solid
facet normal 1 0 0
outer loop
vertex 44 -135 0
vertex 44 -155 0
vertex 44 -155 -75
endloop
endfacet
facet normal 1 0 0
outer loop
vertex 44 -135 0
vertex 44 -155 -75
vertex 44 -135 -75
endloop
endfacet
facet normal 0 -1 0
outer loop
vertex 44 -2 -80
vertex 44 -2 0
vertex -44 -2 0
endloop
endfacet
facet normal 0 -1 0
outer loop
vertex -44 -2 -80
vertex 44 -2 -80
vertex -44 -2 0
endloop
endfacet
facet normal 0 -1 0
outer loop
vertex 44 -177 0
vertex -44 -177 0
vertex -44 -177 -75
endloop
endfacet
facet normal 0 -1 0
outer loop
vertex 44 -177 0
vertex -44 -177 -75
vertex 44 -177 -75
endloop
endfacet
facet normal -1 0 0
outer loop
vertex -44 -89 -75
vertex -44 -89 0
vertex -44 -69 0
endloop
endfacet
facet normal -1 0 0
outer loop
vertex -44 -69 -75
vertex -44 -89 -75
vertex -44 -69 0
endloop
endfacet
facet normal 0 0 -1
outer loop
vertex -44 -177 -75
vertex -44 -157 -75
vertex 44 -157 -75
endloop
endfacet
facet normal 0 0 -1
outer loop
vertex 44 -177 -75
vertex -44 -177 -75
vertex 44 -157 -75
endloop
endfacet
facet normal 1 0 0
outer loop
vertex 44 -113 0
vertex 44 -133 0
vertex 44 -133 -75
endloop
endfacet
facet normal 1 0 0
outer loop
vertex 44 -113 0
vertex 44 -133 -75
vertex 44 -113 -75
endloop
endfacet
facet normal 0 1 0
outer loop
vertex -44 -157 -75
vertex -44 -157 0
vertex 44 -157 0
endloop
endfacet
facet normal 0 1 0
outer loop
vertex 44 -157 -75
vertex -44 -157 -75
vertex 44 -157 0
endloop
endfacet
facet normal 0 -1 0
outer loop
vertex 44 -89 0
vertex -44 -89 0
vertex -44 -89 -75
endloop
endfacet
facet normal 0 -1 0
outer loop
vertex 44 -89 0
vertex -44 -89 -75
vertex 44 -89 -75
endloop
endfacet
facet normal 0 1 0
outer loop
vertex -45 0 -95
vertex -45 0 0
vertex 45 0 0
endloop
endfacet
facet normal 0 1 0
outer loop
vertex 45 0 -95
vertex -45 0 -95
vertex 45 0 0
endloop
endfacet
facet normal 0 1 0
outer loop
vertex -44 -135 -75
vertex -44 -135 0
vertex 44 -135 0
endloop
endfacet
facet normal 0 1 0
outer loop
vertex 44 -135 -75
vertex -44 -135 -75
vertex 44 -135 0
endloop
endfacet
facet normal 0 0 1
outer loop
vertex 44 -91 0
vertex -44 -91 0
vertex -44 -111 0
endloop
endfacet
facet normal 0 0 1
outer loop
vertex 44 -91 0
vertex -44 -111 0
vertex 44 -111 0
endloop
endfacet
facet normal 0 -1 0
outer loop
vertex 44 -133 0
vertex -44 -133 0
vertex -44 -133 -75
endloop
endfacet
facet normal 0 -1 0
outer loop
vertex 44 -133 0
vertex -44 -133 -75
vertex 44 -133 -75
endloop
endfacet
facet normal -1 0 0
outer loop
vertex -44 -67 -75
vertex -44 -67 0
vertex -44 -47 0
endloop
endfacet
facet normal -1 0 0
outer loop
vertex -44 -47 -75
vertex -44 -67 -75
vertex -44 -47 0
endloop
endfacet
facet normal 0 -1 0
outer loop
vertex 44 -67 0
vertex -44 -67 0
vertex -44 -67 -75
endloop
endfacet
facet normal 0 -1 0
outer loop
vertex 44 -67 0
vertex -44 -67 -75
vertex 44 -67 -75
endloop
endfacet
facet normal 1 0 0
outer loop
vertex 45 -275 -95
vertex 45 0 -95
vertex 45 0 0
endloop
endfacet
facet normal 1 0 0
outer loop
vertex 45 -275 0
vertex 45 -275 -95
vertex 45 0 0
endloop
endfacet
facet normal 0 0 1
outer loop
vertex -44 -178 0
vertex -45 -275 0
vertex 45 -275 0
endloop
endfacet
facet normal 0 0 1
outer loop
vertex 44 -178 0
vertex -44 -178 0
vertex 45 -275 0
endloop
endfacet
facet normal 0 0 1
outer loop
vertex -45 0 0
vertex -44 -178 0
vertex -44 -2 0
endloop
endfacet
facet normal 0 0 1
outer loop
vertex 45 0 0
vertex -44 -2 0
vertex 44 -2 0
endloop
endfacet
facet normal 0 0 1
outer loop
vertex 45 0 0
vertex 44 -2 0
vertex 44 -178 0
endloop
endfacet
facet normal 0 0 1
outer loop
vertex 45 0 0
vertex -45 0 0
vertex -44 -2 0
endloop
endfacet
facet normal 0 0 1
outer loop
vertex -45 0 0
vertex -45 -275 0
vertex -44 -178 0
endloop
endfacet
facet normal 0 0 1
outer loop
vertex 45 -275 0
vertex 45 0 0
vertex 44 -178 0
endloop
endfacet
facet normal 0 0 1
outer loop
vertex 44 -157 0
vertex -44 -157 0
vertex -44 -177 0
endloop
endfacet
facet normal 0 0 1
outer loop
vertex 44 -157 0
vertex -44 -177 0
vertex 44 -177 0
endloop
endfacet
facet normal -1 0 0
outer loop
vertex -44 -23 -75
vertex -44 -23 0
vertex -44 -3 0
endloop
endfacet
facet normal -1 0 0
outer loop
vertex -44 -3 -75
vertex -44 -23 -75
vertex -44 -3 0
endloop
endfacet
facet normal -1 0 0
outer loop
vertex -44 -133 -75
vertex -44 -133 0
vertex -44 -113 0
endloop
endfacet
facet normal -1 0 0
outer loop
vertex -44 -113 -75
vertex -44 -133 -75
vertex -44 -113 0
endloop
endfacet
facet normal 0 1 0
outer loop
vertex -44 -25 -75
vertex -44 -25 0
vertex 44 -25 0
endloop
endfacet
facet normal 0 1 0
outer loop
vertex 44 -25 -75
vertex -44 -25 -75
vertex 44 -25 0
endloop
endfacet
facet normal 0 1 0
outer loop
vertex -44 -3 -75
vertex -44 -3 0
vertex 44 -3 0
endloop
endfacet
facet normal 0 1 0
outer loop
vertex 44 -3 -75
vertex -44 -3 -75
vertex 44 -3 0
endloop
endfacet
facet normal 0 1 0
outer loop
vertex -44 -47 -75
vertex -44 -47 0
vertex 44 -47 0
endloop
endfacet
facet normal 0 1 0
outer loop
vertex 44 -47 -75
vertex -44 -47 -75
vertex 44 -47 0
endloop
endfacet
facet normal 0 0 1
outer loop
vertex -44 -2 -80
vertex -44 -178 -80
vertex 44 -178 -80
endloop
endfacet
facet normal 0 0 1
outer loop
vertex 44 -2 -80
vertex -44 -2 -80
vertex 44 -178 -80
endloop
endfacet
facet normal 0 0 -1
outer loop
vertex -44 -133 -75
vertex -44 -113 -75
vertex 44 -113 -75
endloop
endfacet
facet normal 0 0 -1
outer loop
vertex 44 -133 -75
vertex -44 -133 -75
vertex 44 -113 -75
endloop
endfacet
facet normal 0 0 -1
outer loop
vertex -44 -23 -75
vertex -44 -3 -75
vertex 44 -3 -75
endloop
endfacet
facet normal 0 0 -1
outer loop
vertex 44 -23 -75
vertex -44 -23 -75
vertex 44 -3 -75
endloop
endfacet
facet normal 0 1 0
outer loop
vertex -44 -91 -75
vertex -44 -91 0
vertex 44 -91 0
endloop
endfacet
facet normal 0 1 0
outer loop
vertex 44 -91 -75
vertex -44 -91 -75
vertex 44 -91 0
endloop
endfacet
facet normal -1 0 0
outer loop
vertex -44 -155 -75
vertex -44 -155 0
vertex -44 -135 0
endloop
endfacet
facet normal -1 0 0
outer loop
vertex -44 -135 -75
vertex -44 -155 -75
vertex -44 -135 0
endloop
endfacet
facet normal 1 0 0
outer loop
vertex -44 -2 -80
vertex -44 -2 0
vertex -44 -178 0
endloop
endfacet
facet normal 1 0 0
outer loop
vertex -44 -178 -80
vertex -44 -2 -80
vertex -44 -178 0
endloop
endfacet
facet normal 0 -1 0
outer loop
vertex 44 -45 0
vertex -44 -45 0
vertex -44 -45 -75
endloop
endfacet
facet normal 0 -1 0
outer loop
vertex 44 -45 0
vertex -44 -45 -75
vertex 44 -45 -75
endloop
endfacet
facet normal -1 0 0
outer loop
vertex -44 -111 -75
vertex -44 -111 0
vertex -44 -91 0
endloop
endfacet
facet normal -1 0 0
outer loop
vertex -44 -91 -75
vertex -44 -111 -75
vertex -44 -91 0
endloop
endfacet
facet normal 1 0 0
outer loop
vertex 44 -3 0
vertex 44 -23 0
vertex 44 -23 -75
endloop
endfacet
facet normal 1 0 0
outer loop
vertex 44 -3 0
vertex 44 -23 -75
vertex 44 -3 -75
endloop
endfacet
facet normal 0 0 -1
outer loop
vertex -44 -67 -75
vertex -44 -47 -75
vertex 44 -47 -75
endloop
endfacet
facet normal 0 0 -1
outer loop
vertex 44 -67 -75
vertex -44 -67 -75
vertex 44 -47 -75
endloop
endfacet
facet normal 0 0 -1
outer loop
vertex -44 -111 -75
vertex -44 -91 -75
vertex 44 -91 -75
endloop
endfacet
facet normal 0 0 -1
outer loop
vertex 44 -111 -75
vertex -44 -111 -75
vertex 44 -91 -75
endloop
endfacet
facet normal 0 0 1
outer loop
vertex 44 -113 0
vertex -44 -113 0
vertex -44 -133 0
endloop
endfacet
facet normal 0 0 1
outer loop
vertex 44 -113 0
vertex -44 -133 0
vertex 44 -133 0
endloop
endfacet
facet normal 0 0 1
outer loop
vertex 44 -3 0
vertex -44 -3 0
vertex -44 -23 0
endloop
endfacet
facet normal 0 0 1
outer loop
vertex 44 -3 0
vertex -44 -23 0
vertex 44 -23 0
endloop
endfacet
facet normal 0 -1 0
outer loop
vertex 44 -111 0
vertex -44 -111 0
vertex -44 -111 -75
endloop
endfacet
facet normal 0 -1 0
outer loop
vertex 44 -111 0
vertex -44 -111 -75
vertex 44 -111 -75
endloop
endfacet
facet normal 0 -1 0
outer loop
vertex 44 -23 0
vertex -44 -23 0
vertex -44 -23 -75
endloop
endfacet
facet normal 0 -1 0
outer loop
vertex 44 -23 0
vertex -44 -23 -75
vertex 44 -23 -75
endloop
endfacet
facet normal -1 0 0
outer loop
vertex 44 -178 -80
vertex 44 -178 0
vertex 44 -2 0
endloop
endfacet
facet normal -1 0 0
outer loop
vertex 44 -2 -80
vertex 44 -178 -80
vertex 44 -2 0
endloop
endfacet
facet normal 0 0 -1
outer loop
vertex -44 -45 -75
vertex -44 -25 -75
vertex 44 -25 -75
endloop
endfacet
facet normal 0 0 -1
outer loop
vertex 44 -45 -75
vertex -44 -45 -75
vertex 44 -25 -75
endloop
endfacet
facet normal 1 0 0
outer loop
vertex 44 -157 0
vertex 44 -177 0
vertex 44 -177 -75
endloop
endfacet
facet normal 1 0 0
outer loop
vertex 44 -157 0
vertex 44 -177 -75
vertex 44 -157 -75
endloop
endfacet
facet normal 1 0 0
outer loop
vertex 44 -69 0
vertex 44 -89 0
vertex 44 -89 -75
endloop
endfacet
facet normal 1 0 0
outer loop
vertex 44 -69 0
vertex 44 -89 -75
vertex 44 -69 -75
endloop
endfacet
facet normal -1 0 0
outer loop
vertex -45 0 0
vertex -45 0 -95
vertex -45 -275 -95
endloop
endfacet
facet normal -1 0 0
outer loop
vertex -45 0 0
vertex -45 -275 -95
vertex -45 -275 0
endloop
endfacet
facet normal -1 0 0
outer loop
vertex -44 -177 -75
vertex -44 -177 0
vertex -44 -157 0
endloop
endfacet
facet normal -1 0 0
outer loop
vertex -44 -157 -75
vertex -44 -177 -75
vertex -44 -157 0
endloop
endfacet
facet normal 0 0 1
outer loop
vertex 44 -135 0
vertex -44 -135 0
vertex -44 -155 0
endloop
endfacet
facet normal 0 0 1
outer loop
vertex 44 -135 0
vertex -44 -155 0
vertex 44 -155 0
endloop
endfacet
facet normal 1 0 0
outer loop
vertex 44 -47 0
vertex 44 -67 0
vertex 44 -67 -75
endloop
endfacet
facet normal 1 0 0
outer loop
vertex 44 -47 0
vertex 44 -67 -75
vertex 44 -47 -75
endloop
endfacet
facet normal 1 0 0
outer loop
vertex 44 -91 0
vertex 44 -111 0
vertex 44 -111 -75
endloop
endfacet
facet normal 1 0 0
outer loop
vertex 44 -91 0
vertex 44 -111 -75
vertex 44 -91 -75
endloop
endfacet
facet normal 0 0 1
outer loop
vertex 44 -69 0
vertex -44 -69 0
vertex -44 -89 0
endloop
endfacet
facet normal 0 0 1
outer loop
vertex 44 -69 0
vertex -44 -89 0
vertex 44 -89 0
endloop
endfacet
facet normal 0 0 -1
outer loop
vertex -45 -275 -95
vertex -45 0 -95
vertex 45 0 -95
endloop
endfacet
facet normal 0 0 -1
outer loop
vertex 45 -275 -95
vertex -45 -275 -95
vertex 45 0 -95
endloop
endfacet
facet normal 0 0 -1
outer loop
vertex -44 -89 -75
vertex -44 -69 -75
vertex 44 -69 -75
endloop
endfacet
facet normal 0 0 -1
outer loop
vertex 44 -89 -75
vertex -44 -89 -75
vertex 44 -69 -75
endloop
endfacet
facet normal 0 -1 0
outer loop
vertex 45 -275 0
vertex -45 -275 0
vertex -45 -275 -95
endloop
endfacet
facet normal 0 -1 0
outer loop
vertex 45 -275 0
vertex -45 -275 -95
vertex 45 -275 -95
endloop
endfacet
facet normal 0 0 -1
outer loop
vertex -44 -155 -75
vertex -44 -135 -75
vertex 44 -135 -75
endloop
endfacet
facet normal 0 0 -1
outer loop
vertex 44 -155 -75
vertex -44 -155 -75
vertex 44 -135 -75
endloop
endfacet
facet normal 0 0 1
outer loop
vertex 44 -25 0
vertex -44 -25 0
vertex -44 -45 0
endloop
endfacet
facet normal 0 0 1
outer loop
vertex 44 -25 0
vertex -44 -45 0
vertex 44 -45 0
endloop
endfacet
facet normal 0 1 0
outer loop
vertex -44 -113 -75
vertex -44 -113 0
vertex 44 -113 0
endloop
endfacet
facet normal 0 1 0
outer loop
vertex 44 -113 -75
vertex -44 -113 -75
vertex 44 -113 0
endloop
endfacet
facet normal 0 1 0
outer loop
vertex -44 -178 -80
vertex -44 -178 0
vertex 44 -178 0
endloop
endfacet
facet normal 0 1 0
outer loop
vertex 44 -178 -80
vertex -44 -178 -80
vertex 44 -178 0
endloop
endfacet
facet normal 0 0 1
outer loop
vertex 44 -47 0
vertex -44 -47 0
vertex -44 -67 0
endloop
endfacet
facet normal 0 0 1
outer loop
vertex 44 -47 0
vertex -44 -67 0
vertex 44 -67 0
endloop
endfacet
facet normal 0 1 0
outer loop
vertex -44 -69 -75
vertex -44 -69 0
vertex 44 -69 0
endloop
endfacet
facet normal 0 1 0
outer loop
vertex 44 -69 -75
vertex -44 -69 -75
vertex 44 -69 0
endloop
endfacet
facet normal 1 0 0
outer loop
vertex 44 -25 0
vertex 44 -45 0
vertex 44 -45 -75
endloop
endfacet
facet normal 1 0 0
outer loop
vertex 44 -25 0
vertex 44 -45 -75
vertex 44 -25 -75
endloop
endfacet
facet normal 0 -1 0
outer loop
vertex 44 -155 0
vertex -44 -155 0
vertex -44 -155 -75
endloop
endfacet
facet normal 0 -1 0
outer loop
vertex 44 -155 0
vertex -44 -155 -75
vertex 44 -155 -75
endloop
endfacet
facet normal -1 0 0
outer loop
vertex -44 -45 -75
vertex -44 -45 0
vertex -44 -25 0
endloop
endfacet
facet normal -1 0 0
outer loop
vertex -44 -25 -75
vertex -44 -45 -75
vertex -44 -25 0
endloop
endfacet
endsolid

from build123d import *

# Parameters (mm, degrees)
F0_W     = 90
F0_H     = 95
F1_DEPTH = 275
F3_DEPTH = 80
F4_W     = 88
F4_H     = 20
F5_DEPTH = 75


with BuildPart() as f1:
    # F0 (on Front) → F1 (new body)
    with BuildSketch(Plane.XZ):
        with Locations((0, -47.5)):
            Rectangle(F0_W, F0_H)
    extrude(amount=F1_DEPTH)

    # F2 (on face) → F3 (cut)
    with BuildSketch(Plane.XY):
        Polygon((44, -2), (-44, -2), (-44, -24), (-44, -46), (-44, -68), (-44, -90), (-44, -112), (-44, -134), (-44, -156), (-44, -178), (44, -178), (44, -156), (44, -134), (44, -112), (44, -90), (44, -68), (44, -46), (44, -24), align=None)
    extrude(amount=-F3_DEPTH, mode=Mode.SUBTRACT)


with BuildPart() as f5:
    # F4 (on Top) → F5 (new body)
    with BuildSketch(Plane.XY):
        with Locations((0, -13)):
            Rectangle(F4_W, F4_H)
        with Locations((0, -35)):
            Rectangle(F4_W, F4_H)
        with Locations((0, -57)):
            Rectangle(F4_W, F4_H)
        with Locations((0, -79)):
            Rectangle(F4_W, F4_H)
        with Locations((0, -101)):
            Rectangle(F4_W, F4_H)
        with Locations((0, -123)):
            Rectangle(F4_W, F4_H)
        with Locations((0, -145)):
            Rectangle(F4_W, F4_H)
        with Locations((0, -167)):
            Rectangle(F4_W, F4_H)
    extrude(amount=-F5_DEPTH)


solid = Compound([f1.part, f5.part])
